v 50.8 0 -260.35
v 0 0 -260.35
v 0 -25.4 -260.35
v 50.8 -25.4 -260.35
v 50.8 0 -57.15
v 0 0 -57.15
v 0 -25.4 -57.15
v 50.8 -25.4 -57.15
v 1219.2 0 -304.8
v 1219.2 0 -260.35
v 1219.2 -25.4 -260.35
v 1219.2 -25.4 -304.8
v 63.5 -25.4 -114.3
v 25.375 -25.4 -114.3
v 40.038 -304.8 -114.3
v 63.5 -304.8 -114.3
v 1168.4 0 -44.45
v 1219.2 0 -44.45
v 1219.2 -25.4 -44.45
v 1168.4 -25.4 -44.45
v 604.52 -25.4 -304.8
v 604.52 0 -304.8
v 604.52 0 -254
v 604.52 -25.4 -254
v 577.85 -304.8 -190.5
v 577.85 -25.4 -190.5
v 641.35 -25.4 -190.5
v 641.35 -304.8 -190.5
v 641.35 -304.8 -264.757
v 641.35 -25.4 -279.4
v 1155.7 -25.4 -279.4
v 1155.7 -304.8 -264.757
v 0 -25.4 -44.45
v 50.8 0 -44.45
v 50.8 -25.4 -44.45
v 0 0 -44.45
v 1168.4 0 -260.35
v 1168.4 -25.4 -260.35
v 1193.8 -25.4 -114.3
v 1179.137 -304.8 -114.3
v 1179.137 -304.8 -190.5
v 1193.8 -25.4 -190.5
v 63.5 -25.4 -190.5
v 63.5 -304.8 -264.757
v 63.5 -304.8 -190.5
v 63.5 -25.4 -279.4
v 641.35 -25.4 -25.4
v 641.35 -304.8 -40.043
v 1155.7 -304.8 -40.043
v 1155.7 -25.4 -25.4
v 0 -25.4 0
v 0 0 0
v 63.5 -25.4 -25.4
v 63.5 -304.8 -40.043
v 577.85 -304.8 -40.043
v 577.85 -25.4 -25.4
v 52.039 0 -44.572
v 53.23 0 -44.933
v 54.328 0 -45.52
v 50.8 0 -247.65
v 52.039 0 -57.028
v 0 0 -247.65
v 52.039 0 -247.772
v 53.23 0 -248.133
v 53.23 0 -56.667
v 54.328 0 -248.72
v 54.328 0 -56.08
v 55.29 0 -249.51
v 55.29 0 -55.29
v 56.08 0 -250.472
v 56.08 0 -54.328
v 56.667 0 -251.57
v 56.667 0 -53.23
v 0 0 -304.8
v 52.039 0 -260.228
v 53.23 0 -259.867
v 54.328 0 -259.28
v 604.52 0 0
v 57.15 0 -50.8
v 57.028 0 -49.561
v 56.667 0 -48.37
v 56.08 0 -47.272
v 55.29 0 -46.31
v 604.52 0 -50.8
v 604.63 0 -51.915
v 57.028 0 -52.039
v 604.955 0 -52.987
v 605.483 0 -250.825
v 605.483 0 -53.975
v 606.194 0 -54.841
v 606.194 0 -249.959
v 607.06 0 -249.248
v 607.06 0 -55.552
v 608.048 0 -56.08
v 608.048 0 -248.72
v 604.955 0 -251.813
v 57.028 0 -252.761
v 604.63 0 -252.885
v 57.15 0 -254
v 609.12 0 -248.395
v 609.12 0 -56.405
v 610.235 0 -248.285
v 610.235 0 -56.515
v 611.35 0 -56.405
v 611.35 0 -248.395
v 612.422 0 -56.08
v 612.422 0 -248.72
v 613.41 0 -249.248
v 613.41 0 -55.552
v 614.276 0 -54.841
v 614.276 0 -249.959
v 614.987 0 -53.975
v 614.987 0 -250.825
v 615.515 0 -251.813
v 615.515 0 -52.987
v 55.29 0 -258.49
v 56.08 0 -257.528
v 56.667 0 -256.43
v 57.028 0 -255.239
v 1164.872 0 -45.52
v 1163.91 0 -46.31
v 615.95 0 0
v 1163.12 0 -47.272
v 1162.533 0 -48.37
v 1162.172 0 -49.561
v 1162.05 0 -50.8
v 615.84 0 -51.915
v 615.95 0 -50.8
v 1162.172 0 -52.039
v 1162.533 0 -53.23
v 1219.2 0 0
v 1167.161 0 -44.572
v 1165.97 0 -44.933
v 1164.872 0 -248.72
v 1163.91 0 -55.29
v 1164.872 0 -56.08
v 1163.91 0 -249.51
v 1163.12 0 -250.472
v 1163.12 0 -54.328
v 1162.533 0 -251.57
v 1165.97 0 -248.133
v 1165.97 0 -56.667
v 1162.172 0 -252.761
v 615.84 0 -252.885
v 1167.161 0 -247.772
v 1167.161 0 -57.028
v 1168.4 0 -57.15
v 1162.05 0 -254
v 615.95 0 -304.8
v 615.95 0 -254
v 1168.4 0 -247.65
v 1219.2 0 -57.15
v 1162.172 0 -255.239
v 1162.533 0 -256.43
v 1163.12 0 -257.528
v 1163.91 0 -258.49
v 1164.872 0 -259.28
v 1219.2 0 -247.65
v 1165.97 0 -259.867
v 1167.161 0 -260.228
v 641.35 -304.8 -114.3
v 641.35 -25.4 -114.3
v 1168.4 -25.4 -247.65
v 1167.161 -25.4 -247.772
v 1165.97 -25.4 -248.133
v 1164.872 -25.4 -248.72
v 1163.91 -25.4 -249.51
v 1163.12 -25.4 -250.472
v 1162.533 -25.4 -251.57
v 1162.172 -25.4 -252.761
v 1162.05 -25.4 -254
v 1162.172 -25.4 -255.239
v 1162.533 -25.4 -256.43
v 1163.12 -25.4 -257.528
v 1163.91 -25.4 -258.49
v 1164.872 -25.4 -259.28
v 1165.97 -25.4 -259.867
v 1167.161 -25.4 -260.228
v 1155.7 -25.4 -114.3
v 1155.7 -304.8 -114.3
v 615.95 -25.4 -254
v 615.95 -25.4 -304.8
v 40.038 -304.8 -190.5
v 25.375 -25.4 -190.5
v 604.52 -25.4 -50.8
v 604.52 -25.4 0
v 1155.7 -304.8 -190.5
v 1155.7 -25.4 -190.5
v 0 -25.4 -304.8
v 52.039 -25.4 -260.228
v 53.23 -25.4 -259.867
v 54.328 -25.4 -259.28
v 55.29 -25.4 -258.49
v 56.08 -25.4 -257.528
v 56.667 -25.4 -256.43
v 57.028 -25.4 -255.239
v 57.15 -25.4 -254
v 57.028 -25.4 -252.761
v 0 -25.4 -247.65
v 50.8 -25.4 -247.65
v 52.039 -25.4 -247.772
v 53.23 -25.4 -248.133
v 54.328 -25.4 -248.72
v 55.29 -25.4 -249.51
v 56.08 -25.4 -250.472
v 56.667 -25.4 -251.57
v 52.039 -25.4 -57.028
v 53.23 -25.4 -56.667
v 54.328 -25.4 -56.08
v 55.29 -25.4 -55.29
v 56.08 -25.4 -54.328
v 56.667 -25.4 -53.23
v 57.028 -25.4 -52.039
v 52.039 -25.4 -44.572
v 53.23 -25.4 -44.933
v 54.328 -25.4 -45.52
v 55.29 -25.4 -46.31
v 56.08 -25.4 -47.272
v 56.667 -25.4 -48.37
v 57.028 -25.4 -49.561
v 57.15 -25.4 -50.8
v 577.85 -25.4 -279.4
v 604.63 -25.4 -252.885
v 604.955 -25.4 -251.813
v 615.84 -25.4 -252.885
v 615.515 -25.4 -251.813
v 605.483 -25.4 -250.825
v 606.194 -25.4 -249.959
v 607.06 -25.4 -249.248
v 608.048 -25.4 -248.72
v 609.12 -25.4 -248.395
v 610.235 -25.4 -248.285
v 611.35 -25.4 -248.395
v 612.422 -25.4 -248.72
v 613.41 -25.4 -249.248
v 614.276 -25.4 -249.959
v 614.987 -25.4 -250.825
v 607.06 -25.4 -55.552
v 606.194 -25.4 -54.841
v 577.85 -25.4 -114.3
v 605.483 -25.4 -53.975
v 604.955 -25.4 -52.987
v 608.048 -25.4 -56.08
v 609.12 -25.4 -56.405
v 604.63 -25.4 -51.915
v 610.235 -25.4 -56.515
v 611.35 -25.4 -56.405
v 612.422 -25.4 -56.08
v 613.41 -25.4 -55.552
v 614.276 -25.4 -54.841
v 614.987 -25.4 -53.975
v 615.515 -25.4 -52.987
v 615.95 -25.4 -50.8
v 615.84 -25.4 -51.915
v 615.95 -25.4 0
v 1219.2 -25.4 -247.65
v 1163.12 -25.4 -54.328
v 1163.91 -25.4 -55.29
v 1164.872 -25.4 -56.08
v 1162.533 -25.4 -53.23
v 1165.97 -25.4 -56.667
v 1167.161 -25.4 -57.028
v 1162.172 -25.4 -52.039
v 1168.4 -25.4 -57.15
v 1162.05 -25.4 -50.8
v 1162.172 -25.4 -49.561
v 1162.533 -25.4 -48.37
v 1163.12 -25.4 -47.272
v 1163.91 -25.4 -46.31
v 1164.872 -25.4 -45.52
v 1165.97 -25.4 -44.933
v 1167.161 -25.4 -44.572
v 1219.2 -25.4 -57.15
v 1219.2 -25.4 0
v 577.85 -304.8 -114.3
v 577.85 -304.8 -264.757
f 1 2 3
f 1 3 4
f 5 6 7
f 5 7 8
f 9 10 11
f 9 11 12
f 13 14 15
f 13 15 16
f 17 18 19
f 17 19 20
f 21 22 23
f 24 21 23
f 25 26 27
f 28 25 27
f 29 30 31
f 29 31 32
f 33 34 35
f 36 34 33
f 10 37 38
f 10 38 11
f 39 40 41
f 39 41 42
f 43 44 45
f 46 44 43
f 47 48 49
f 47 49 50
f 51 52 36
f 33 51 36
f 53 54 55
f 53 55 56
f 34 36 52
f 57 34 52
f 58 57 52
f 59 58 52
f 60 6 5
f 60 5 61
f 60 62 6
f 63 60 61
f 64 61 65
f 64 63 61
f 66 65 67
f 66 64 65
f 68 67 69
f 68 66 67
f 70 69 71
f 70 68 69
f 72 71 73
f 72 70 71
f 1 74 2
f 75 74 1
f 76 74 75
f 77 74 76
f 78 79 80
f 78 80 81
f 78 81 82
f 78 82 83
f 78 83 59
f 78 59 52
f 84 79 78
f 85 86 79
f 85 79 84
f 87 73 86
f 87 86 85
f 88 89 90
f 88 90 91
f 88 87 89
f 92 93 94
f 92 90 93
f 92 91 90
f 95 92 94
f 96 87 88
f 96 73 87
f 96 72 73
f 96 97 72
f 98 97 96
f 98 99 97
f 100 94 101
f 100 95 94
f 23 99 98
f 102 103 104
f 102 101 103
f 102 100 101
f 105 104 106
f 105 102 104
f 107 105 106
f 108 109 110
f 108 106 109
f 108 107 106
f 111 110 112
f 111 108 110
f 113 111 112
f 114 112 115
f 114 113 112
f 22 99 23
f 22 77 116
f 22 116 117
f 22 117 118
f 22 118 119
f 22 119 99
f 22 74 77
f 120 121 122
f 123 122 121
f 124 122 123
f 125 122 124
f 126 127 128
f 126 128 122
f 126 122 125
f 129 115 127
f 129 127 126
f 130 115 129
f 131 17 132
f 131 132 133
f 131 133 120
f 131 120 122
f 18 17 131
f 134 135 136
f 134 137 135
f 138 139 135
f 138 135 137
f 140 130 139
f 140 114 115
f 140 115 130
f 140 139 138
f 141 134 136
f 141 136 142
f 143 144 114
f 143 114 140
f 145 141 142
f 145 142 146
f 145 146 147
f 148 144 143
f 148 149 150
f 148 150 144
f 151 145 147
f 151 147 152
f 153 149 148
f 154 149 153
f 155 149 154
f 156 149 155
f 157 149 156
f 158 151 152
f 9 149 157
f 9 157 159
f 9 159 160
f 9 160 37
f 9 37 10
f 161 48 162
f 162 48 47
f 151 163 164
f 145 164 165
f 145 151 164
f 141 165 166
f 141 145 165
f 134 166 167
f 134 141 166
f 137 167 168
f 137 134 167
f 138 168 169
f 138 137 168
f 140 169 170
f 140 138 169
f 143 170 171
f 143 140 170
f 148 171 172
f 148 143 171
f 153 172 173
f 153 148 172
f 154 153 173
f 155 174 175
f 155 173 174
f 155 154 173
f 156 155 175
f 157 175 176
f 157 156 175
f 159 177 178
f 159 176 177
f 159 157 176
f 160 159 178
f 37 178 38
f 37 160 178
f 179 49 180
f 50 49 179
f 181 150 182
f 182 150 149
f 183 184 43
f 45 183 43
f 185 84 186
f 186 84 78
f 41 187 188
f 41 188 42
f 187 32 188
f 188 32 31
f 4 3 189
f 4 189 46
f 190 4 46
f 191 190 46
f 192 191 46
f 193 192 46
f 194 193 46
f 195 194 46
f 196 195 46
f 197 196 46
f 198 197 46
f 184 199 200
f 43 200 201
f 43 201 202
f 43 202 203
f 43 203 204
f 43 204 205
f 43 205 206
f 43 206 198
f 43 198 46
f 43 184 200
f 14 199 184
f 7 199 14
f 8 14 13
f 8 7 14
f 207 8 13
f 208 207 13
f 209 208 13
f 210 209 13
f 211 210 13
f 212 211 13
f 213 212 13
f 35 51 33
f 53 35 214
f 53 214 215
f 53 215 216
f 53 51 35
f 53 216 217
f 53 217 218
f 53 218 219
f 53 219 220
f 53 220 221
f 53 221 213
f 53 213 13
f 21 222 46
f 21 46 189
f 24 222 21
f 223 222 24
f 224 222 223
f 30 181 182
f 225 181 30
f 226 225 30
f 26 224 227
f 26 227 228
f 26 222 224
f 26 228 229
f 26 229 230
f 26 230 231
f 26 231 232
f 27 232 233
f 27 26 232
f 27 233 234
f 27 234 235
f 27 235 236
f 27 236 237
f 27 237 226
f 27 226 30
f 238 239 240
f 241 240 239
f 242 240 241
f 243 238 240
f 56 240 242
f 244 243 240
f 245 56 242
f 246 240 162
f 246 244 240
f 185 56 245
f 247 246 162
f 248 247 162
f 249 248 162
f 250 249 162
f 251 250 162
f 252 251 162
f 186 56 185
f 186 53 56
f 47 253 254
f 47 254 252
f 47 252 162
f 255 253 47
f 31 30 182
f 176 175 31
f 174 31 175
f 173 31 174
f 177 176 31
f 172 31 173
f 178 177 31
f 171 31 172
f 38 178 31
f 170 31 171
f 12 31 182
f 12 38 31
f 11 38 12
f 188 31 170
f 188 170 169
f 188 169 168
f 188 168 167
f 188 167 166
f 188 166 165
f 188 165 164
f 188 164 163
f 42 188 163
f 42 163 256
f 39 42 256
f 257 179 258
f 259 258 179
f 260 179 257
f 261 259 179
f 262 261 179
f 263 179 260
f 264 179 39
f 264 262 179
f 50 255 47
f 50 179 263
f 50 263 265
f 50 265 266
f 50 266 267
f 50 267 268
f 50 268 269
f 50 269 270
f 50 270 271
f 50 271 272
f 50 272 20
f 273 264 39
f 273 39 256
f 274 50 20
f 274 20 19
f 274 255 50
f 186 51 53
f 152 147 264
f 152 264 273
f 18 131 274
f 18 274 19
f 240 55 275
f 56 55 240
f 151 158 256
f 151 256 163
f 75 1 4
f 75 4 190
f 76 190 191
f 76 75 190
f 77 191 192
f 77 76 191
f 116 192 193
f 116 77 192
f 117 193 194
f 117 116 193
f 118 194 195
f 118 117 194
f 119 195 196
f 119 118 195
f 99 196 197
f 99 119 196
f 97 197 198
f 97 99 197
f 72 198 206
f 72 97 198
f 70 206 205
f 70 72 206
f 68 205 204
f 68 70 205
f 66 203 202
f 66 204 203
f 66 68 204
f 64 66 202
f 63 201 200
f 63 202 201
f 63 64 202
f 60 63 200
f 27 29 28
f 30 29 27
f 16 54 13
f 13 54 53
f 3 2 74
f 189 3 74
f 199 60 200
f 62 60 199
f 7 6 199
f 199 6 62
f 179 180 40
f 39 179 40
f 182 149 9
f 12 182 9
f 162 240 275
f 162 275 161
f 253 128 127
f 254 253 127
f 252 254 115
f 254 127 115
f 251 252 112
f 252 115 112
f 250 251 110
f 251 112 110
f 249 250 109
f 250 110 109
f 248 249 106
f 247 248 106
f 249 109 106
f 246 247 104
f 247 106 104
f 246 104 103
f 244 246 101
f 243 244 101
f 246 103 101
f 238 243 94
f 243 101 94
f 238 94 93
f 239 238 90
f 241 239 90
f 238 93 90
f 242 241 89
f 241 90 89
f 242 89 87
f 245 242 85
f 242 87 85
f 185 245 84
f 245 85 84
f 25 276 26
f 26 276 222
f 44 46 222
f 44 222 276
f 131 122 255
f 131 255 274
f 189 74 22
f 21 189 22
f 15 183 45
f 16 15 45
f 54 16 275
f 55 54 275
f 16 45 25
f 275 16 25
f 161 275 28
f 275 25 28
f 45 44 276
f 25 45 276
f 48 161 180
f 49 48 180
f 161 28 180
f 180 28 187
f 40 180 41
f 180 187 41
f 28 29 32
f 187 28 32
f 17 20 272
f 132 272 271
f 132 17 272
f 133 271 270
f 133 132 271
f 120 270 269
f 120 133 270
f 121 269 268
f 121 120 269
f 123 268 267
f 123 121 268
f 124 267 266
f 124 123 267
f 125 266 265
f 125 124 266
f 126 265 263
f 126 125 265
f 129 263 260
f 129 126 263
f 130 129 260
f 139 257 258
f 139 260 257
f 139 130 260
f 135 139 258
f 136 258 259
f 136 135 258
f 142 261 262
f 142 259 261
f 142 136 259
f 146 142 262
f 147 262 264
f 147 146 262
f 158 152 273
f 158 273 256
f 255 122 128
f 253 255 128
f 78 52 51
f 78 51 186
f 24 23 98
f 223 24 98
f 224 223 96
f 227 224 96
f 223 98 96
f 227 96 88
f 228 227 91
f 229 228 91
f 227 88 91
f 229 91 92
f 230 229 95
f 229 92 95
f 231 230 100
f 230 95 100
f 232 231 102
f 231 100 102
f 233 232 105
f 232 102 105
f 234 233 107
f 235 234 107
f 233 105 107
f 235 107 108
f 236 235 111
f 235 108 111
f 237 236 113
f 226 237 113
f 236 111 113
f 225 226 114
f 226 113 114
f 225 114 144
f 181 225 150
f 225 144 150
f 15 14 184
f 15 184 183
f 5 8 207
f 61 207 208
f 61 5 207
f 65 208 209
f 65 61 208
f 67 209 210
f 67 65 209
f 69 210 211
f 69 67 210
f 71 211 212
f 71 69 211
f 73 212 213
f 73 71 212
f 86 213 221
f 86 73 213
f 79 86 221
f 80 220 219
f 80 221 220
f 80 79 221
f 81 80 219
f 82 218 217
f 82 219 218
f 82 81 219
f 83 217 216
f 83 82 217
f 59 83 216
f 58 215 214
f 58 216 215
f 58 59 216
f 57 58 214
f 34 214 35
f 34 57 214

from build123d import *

# Parameters (mm, degrees)
SKETCH1_W           = 1219.2
SKETCH1_H           = 304.8
BOSS_EXTRUDE1_DEPTH = 304.8
CUT_EXTRUDE1_DEPTH  = 1294.156881434
CUT_EXTRUDE2_DEPTH  = 1294.156881434
CUT_EXTRUDE4_DEPTH  = 1294.156881434
SKETCH7_W           = 63.5
SKETCH7_H           = 279.4
CUT_EXTRUDE5_DEPTH  = 114.3


with BuildPart() as part:
    # Sketch1 → Boss-Extrude1 (new body)
    with BuildSketch(Plane(origin=(0, 0, 0), x_dir=(1, 0, 0), z_dir=(0, 1, 0))):
        with Locations((609.6, 152.4)):
            Rectangle(SKETCH1_W, SKETCH1_H)
    extrude(amount=-BOSS_EXTRUDE1_DEPTH)

    # Sketch2 → Cut-Extrude1 (cut, through all)
    with BuildSketch(Plane(origin=(0, 0, 0), x_dir=(1, 0, 0), z_dir=(0, 1, 0))):
        with BuildLine():
            Line((0, 260.35), (50.8, 260.35))
            ThreePointArc((50.8, 260.35), (57.15, 254), (50.8, 247.65))
            Line((50.8, 247.65), (0, 247.65))
            Line((0, 247.65), (0, 260.35))
        make_face()
        with BuildLine():
            Line((0, 57.15), (50.8, 57.15))
            ThreePointArc((50.8, 57.15), (57.15, 50.8), (50.8, 44.45))
            Line((50.8, 44.45), (0, 44.45))
            Line((0, 44.45), (0, 57.15))
        make_face()
        with BuildLine():
            Line((1219.2, 57.15), (1219.2, 44.45))
            Line((1219.2, 44.45), (1168.4, 44.45))
            ThreePointArc((1168.4, 44.45), (1162.05, 50.8), (1168.4, 57.15))
            Line((1168.4, 57.15), (1219.2, 57.15))
        make_face()
        with BuildLine():
            Line((1219.2, 260.35), (1219.2, 247.65))
            Line((1219.2, 247.65), (1168.4, 247.65))
            ThreePointArc((1168.4, 247.65), (1162.05, 254), (1168.4, 260.35))
            Line((1168.4, 260.35), (1219.2, 260.35))
        make_face()
        with BuildLine():
            Line((604.52, 304.8), (604.52, 254))
            ThreePointArc((604.52, 254), (610.235, 248.285), (615.95, 254))
            Line((615.95, 254), (615.95, 304.8))
            Line((615.95, 304.8), (604.52, 304.8))
        make_face()
        with BuildLine():
            Line((615.95, 0), (615.95, 50.8))
            ThreePointArc((615.95, 50.8), (610.235, 56.515), (604.52, 50.8))
            Line((604.52, 50.8), (604.52, 0))
            Line((604.52, 0), (615.95, 0))
        make_face()
    extrude(amount=-CUT_EXTRUDE1_DEPTH, mode=Mode.SUBTRACT)

    # Sketch4 → Cut-Extrude2 (cut, through all)
    with BuildSketch(Plane.ZY):
        Polygon((-304.8, -25.4), (-279.4, -25.4), (-264.757266468, -304.8), (-304.8, -304.8), align=None)
        Polygon((-40.042733532, -304.8), (-25.4, -25.4), (0, -25.4), (0, -304.8), align=None)
    extrude(amount=-CUT_EXTRUDE2_DEPTH, mode=Mode.SUBTRACT)

    # Sketch6 → Cut-Extrude4 (cut, through all)
    with BuildSketch(Plane.XY):
        Polygon((0, -25.4), (25.375259462, -25.4), (40.03808789, -304.8), (0, -304.8), align=None)
        Polygon((1193.8, -25.4), (1219.2, -25.4), (1219.2, -304.8), (1179.137171572, -304.8), align=None)
    extrude(amount=-CUT_EXTRUDE4_DEPTH, mode=Mode.SUBTRACT)

    # Sketch7 → Cut-Extrude5 (cut)
    with BuildSketch(Plane.XY):
        with Locations((1187.45, -165.1)):
            Rectangle(SKETCH7_W, SKETCH7_H)
        with Locations((31.75, -165.1)):
            Rectangle(SKETCH7_W, SKETCH7_H)
        with Locations((609.6, -165.1)):
            Rectangle(SKETCH7_W, SKETCH7_H)
    cut_extrude5 = extrude(amount=-CUT_EXTRUDE5_DEPTH, mode=Mode.SUBTRACT)

    # Mirror1: Cut-Extrude5 across plane
    add(cut_extrude5.mirror(Plane(origin=(0, 0, -152.4), x_dir=(1, 0, 0), z_dir=(0, 0, -1))), mode=Mode.SUBTRACT)


solid = part.part
